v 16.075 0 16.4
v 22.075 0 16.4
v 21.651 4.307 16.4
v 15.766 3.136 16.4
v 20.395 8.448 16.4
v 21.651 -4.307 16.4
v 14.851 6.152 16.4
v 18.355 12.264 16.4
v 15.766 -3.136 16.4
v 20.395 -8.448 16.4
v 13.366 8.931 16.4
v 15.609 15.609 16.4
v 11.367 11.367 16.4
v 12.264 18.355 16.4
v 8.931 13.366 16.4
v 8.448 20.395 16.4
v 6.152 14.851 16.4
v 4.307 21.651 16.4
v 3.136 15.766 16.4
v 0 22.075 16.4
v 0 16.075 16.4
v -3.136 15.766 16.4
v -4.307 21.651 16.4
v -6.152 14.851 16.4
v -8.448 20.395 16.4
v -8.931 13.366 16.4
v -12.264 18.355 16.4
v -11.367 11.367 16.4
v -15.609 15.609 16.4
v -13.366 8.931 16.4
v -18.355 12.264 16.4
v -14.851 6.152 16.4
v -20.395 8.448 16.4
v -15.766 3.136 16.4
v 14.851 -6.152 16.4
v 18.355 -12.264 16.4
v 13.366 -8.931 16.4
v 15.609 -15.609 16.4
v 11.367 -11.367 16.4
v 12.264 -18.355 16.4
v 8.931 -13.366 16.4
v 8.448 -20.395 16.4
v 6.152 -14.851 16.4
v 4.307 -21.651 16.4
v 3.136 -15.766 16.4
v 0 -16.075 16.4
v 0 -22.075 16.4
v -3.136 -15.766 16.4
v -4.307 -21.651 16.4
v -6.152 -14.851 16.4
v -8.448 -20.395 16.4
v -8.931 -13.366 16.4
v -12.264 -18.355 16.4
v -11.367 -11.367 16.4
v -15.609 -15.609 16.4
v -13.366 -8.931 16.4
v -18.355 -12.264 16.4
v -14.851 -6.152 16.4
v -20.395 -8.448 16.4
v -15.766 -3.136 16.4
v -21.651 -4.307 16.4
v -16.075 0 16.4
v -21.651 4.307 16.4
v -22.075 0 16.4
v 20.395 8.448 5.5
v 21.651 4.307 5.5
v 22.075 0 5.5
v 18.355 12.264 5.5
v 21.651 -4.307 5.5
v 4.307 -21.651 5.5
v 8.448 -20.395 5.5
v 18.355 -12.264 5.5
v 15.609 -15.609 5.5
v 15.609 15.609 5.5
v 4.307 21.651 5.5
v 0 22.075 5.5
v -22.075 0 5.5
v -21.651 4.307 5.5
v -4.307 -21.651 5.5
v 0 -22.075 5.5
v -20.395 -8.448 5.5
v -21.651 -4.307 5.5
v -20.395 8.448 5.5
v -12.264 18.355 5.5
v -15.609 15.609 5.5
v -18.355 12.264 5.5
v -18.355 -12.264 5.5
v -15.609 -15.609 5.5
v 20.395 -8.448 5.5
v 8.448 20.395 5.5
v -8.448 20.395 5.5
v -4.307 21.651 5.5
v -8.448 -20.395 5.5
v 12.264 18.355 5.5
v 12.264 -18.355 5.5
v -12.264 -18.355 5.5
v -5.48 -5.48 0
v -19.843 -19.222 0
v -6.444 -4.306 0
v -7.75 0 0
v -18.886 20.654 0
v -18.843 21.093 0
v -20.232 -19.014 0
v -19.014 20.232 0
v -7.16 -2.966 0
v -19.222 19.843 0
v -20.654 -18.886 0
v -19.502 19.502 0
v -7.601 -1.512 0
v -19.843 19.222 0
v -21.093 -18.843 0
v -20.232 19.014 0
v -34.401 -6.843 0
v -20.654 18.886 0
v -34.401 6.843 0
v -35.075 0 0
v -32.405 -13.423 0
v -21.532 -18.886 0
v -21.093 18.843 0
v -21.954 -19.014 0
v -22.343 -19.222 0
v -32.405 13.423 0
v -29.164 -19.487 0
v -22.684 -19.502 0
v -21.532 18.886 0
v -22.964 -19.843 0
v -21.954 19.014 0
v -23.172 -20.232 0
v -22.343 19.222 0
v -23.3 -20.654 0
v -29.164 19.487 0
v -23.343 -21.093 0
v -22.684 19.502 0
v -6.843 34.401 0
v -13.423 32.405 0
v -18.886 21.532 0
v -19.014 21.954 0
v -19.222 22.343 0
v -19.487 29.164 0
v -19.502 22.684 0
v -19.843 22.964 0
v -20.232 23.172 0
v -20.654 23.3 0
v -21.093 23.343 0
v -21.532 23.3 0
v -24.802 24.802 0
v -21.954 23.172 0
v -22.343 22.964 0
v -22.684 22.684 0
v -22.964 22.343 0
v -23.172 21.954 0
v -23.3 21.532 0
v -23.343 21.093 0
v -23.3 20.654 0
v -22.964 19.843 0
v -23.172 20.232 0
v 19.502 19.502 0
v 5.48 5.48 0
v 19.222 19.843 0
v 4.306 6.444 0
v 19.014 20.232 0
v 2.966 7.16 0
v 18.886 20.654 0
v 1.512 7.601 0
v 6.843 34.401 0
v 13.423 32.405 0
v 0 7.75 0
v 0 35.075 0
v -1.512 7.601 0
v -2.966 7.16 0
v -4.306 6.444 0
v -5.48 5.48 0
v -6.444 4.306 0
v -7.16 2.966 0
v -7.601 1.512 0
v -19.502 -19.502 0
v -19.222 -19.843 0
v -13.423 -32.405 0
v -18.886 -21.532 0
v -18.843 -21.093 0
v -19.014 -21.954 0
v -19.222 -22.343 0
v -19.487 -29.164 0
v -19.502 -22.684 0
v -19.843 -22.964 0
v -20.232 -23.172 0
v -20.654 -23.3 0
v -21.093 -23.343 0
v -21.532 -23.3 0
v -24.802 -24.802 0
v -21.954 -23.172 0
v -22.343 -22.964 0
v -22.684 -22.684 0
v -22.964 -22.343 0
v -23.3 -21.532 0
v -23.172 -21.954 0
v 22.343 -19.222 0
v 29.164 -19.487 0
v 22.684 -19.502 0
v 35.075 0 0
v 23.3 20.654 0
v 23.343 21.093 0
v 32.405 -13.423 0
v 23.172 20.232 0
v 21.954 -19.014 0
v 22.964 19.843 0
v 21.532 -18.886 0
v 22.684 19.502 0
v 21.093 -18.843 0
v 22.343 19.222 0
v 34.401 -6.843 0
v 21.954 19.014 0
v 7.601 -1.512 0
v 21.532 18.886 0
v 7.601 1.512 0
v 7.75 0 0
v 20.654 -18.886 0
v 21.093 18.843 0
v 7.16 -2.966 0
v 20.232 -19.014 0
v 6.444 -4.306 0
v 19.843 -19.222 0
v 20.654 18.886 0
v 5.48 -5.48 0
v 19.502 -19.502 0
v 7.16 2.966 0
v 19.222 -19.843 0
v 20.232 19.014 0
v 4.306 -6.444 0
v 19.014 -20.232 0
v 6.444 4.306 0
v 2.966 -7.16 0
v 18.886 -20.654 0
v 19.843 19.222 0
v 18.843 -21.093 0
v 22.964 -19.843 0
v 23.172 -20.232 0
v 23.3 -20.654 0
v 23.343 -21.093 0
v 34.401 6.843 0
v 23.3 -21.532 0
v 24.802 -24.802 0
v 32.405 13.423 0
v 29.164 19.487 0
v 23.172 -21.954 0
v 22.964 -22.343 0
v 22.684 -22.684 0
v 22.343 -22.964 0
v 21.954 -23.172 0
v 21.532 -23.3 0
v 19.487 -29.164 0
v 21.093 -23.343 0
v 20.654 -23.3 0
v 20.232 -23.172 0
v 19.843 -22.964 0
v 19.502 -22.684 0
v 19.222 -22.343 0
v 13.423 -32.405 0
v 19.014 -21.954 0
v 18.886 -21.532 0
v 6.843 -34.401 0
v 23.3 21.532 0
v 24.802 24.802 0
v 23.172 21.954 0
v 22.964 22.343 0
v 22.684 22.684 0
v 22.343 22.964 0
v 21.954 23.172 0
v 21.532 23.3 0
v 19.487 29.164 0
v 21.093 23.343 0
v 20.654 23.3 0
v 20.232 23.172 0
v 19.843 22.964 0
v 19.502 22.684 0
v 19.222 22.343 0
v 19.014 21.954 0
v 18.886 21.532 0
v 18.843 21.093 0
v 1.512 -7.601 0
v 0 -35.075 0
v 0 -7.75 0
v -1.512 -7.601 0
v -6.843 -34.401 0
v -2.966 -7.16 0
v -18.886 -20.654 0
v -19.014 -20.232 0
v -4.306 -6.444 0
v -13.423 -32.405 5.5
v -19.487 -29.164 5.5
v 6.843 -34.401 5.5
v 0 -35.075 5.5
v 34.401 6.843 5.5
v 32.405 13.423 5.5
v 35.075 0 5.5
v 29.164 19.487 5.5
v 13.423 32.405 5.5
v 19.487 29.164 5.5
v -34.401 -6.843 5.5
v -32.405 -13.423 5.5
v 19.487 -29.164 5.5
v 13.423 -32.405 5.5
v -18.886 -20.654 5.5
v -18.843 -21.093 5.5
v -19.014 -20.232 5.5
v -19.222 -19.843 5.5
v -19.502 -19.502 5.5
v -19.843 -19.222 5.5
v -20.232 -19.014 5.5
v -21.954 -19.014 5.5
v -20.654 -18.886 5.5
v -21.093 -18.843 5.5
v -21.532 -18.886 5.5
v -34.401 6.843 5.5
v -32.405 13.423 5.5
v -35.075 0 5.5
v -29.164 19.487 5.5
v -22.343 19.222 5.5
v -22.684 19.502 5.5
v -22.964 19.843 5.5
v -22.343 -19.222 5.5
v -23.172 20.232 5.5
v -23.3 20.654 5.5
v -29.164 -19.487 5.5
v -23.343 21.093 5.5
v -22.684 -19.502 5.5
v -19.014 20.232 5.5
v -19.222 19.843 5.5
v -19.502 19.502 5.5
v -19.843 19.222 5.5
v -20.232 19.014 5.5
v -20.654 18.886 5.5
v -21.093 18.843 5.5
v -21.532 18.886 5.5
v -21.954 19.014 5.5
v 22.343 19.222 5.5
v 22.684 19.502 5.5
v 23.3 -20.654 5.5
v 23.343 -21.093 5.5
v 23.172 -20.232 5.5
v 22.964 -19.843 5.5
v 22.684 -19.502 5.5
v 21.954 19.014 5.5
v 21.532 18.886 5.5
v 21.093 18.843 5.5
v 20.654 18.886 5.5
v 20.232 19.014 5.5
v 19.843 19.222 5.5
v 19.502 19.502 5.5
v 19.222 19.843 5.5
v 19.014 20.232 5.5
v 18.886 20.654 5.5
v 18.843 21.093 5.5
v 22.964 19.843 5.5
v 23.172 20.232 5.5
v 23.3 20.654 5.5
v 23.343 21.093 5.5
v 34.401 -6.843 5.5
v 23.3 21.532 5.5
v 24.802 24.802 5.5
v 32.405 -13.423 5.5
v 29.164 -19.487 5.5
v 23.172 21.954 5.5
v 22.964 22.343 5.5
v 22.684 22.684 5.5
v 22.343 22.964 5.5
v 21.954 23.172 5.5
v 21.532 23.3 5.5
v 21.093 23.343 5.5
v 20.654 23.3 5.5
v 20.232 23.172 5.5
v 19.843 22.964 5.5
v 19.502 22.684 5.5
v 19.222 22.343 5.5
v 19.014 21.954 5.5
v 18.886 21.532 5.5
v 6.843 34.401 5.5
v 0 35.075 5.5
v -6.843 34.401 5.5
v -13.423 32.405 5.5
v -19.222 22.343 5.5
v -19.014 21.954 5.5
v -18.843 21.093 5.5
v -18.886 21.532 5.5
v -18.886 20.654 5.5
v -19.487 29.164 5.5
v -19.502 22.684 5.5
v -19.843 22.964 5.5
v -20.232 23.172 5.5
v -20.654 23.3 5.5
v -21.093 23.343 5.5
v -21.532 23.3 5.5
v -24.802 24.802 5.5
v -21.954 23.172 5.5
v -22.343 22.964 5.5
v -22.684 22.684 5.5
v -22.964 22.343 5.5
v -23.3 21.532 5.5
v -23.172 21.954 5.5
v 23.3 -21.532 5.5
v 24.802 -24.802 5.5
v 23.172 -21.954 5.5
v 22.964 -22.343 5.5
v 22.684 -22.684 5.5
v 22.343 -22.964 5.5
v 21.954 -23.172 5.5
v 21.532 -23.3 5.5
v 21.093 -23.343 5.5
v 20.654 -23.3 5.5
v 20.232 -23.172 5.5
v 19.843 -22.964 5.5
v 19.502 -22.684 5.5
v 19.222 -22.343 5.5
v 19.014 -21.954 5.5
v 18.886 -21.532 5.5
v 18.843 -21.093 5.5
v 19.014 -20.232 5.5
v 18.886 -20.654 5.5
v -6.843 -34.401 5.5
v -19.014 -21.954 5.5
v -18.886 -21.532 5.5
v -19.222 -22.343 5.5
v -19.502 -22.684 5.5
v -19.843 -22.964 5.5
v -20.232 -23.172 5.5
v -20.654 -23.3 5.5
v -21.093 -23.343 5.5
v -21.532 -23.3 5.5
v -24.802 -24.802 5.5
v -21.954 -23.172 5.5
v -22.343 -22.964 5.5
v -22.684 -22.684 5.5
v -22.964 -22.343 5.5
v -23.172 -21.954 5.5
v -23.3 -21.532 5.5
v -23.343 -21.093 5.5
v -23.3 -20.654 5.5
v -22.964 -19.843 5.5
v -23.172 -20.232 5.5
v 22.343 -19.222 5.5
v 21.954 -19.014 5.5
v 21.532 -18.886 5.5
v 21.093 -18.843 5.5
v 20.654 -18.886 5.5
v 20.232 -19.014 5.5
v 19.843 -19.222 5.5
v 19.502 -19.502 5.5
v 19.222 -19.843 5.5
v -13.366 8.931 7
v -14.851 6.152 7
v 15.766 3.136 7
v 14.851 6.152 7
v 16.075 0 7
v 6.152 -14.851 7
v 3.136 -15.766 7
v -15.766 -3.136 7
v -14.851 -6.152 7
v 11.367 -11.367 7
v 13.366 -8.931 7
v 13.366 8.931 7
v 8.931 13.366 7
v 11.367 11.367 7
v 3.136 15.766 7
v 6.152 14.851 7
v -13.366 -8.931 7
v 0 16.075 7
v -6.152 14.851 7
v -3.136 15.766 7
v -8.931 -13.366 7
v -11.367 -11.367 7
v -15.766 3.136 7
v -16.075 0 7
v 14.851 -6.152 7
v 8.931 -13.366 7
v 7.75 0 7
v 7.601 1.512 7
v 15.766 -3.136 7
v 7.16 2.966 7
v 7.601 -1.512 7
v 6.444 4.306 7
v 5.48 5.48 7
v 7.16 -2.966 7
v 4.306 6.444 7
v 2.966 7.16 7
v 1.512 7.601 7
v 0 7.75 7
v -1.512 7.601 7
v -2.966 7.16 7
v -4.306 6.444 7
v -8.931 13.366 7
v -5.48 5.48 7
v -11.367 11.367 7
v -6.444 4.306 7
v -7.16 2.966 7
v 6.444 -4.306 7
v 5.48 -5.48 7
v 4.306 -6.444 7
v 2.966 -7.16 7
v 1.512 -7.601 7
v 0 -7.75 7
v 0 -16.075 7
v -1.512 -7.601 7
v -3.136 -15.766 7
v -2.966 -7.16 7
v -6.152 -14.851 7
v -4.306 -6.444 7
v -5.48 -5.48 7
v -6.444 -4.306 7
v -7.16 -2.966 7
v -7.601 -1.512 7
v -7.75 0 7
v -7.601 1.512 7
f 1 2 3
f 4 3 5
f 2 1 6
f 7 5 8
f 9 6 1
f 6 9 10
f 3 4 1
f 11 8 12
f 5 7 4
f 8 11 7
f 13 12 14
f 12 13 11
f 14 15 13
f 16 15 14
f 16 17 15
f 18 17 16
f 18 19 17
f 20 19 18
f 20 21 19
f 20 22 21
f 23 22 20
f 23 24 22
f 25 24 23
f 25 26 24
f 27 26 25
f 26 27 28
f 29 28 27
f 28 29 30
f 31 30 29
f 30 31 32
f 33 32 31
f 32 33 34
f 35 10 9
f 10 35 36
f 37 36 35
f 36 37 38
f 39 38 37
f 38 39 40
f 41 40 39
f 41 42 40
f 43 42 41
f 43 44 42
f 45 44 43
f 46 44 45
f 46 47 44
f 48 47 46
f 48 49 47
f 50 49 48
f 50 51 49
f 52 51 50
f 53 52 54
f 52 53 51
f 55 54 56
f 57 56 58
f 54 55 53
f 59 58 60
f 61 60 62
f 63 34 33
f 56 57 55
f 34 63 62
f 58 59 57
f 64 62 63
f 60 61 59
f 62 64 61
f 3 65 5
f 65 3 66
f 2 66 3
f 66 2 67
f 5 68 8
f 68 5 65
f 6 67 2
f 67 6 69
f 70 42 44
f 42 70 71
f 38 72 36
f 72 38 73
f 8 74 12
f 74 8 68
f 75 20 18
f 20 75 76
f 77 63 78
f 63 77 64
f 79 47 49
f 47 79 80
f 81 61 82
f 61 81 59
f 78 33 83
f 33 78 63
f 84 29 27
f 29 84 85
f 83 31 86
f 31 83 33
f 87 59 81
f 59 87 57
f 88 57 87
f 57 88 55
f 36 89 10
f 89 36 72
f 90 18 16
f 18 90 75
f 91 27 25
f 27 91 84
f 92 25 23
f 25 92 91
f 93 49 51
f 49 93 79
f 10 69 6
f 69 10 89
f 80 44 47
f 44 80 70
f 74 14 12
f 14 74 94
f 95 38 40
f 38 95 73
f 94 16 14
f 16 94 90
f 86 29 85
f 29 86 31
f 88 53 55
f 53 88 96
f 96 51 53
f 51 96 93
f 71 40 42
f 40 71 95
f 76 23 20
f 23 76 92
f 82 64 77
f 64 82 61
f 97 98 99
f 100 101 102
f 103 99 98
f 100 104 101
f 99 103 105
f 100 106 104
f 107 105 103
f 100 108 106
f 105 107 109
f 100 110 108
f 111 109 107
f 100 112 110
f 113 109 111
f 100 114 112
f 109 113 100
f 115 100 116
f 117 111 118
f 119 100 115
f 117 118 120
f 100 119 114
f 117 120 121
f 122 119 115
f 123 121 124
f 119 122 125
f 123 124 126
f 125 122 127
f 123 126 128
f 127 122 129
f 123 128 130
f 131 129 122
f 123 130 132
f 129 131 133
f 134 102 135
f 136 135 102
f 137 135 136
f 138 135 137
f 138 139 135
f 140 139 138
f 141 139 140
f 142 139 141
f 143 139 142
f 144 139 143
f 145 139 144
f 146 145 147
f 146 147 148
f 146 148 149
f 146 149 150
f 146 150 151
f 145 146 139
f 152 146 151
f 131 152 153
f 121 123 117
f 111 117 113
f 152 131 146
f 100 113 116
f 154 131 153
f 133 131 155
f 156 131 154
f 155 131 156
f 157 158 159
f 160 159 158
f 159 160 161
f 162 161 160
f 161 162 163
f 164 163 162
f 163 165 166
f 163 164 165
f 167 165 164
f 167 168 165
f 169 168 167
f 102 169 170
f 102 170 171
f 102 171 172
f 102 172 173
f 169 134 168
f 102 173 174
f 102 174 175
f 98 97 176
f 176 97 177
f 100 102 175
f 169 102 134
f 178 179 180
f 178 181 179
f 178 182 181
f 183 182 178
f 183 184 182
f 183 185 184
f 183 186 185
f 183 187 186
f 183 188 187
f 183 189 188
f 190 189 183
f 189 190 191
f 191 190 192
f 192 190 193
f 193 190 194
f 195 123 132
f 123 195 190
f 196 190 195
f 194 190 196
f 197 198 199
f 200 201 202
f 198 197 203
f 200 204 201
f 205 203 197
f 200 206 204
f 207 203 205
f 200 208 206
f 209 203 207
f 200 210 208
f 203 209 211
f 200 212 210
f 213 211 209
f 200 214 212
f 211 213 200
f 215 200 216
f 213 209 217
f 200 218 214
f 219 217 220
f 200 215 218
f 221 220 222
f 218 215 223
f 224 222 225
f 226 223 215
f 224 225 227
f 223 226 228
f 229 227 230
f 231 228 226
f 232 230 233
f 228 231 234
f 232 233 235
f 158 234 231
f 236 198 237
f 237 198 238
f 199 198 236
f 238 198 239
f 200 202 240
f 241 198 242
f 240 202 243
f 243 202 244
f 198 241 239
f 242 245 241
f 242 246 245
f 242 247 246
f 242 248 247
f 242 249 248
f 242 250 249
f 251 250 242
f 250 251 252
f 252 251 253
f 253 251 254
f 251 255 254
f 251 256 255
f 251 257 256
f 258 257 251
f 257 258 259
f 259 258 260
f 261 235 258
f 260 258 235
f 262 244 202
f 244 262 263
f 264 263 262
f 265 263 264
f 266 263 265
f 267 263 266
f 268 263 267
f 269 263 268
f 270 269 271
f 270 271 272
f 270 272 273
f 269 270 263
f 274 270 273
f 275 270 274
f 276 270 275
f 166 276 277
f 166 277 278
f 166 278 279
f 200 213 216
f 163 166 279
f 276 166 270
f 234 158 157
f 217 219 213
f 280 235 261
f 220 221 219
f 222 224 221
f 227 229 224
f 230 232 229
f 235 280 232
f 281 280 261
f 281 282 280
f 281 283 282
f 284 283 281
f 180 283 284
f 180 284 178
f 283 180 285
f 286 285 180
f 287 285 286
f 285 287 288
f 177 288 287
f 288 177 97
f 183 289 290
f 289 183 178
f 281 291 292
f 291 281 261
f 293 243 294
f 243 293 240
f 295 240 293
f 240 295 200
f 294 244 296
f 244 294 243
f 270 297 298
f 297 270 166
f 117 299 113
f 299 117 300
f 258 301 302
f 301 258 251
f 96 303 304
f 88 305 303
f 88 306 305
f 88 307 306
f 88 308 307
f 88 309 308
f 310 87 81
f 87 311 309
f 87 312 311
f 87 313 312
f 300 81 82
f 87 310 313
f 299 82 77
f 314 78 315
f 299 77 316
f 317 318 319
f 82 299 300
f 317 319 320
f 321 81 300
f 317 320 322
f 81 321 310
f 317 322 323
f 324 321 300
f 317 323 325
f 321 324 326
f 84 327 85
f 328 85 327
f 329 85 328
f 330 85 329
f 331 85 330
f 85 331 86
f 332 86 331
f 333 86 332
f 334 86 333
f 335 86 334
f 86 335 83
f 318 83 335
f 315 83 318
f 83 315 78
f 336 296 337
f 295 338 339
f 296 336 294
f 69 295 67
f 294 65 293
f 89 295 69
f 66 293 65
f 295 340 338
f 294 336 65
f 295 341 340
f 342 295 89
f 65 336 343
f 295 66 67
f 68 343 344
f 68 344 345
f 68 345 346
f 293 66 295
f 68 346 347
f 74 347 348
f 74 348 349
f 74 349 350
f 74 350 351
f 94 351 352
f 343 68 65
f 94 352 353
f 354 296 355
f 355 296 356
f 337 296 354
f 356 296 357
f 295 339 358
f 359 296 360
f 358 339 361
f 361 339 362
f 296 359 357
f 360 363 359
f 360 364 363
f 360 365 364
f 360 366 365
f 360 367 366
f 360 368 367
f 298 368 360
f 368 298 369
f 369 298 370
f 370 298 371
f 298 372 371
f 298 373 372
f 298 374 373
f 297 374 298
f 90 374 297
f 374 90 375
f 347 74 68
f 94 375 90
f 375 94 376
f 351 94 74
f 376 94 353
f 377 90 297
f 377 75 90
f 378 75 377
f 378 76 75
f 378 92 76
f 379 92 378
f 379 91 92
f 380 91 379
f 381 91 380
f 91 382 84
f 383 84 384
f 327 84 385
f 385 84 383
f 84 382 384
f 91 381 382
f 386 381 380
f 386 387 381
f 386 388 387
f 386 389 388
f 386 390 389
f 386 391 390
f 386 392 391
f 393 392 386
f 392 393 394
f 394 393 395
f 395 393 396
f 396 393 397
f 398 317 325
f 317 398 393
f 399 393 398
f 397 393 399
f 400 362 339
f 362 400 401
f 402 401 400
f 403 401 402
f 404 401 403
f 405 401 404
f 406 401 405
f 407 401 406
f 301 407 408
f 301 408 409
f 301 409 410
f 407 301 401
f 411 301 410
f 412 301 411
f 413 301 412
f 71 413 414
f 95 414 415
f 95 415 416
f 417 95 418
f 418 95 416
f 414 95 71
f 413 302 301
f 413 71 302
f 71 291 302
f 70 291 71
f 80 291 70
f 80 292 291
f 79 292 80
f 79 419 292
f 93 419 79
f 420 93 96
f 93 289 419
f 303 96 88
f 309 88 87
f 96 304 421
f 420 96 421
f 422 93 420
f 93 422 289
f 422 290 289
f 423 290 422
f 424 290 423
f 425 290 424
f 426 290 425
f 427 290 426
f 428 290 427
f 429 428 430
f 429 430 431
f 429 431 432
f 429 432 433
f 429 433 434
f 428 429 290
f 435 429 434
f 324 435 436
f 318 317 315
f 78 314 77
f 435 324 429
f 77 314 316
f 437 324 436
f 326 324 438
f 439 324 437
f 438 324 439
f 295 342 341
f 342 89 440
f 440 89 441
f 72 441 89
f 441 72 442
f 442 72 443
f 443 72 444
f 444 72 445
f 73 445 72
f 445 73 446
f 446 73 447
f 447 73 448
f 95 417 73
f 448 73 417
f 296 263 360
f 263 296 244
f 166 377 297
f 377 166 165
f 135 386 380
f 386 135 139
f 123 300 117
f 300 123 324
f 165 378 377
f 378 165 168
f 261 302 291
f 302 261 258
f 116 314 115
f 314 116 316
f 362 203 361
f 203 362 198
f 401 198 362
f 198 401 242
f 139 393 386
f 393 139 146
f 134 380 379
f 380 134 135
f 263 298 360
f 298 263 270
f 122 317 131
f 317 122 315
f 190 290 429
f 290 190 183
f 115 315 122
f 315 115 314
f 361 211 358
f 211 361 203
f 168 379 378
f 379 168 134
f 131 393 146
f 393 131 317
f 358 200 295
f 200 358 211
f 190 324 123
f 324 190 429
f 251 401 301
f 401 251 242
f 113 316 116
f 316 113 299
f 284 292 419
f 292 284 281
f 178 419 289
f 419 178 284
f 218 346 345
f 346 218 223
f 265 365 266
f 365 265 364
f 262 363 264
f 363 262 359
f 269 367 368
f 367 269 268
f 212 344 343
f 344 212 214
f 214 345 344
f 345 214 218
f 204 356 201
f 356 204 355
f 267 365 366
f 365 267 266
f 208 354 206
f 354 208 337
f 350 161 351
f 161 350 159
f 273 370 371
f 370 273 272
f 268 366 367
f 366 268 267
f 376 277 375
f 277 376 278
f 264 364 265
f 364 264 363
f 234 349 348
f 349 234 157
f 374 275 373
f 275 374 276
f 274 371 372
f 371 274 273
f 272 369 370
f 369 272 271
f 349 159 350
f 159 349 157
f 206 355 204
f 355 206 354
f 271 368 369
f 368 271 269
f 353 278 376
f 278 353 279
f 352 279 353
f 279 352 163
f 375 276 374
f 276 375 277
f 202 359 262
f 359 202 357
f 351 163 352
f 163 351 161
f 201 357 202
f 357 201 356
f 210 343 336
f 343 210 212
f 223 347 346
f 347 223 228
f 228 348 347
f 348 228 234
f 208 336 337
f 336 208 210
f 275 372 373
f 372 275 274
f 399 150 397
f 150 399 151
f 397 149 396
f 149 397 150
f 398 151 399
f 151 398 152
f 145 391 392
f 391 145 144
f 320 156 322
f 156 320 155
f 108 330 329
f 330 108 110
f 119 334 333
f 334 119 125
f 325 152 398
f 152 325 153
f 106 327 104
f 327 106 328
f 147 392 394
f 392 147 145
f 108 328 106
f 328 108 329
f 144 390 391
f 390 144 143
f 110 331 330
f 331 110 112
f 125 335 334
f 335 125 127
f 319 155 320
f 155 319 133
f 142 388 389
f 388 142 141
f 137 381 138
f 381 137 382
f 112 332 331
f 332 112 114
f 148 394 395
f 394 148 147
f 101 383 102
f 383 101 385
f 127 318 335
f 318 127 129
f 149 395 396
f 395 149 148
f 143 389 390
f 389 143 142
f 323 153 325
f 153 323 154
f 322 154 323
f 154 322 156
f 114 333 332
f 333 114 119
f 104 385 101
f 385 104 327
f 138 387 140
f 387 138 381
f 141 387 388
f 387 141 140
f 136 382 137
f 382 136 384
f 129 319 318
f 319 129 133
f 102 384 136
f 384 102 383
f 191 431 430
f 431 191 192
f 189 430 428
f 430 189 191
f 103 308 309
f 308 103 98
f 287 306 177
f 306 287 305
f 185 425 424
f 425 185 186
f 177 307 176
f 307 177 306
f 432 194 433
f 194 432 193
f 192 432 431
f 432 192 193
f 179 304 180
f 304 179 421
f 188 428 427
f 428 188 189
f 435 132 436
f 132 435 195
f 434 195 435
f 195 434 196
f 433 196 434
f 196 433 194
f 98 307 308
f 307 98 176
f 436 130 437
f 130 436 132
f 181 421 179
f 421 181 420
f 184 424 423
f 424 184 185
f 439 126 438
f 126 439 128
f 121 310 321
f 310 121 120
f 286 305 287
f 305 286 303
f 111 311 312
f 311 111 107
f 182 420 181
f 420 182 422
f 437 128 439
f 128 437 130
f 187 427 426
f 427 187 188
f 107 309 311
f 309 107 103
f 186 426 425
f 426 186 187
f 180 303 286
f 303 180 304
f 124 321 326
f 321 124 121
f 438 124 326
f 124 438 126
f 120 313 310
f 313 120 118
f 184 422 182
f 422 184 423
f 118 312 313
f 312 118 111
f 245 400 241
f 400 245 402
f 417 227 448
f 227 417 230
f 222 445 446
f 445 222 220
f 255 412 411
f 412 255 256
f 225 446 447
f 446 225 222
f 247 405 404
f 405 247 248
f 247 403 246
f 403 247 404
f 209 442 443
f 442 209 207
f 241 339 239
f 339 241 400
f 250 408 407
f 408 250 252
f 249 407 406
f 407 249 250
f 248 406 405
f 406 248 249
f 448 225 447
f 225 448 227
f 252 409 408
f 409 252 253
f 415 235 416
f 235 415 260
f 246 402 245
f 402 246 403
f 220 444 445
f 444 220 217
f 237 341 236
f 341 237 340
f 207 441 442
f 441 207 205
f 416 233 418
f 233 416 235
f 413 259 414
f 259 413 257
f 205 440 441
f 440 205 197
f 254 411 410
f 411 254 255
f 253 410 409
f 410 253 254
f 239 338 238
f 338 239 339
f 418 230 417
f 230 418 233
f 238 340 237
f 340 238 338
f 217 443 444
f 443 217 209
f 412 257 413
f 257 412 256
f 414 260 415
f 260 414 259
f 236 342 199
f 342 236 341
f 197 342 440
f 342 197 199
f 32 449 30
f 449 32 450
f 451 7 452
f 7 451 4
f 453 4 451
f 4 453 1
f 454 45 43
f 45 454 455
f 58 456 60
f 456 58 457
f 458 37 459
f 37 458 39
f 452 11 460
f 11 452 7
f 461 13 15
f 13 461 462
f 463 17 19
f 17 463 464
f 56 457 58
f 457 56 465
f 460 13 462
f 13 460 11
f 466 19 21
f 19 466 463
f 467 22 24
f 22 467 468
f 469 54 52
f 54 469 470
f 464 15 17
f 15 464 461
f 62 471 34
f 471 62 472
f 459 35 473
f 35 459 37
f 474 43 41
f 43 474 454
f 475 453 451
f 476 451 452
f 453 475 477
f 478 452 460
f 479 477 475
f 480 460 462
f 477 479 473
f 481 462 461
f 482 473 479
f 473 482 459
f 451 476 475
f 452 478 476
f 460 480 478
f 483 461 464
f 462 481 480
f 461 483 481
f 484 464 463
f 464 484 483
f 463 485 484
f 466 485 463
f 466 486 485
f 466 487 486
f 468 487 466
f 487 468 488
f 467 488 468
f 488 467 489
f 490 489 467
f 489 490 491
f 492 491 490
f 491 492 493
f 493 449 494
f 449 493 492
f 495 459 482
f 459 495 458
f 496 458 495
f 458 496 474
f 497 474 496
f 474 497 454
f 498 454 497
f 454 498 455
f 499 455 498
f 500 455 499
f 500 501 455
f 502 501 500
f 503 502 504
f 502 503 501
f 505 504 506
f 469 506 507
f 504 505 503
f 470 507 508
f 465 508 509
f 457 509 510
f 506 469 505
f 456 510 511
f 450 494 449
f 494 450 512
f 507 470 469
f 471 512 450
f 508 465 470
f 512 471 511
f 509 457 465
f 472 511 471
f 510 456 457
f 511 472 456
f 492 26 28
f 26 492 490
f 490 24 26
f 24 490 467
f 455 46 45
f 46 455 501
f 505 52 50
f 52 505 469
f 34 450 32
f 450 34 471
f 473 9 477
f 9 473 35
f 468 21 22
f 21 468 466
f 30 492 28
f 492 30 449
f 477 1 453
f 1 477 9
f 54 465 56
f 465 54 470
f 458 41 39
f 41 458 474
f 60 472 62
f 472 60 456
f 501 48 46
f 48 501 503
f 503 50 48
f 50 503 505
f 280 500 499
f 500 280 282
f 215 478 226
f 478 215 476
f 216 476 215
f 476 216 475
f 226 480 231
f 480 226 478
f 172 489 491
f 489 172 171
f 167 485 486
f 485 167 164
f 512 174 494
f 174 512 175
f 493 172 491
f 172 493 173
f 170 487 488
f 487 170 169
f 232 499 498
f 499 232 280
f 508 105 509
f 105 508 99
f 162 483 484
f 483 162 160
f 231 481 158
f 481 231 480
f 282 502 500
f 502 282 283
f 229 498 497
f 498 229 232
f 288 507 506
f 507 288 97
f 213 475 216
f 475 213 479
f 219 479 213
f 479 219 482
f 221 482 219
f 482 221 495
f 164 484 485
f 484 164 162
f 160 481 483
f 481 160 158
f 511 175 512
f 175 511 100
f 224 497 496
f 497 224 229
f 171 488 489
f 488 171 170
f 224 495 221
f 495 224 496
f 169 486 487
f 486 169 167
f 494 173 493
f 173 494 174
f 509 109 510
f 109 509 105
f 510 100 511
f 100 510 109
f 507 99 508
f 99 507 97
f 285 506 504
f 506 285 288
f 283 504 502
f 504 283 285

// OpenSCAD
$fn = 32;

// ----------------------------------------------------------------------
// Bearing housing: seat for 6002 (32 x 9 mm), 44.15 mm body
// ----------------------------------------------------------------------

// --- parameters (mm) ---
housing_d = 44.15;        // housing outside diameter
housing_h = 16.4;         // overall housing height
wall_t = 6;               // wall thickness
seat_d = 32.15;           // 6002 seat, 0.15 mm clearance
seat_h = 9.4;             // pocket depth
shoulder = 3;             // shoulder under the bearing
pass_d = 15.5;            // shaft passage
flange_d = 70.15;         // mounting flange diameter
flange_t = 4;             // flange thickness
bolt_d = 4.5;             // flange bolt clearance
bolt_r = 29.83;           // flange bolt circle radius

module body() {
  cylinder(h = housing_h, d = housing_d);
}

module flange() {
  /* flange sunk 1.5 mm into the body */
  cylinder(h = flange_t + 1.5, d = flange_d);
}

difference() {
  union() {
    body();
    flange();
  }
  translate([0, 0, housing_h - seat_h]) cylinder(h = seat_h + 1, d = seat_d);
  translate([0, 0, -1]) cylinder(h = housing_h - seat_h + 1, d = pass_d);
  for (i = [0 : 3]) rotate([0, 0, 45 + i * 90]) translate([bolt_r, 0, -1])
    cylinder(h = flange_t + 3, d = bolt_d);
}
